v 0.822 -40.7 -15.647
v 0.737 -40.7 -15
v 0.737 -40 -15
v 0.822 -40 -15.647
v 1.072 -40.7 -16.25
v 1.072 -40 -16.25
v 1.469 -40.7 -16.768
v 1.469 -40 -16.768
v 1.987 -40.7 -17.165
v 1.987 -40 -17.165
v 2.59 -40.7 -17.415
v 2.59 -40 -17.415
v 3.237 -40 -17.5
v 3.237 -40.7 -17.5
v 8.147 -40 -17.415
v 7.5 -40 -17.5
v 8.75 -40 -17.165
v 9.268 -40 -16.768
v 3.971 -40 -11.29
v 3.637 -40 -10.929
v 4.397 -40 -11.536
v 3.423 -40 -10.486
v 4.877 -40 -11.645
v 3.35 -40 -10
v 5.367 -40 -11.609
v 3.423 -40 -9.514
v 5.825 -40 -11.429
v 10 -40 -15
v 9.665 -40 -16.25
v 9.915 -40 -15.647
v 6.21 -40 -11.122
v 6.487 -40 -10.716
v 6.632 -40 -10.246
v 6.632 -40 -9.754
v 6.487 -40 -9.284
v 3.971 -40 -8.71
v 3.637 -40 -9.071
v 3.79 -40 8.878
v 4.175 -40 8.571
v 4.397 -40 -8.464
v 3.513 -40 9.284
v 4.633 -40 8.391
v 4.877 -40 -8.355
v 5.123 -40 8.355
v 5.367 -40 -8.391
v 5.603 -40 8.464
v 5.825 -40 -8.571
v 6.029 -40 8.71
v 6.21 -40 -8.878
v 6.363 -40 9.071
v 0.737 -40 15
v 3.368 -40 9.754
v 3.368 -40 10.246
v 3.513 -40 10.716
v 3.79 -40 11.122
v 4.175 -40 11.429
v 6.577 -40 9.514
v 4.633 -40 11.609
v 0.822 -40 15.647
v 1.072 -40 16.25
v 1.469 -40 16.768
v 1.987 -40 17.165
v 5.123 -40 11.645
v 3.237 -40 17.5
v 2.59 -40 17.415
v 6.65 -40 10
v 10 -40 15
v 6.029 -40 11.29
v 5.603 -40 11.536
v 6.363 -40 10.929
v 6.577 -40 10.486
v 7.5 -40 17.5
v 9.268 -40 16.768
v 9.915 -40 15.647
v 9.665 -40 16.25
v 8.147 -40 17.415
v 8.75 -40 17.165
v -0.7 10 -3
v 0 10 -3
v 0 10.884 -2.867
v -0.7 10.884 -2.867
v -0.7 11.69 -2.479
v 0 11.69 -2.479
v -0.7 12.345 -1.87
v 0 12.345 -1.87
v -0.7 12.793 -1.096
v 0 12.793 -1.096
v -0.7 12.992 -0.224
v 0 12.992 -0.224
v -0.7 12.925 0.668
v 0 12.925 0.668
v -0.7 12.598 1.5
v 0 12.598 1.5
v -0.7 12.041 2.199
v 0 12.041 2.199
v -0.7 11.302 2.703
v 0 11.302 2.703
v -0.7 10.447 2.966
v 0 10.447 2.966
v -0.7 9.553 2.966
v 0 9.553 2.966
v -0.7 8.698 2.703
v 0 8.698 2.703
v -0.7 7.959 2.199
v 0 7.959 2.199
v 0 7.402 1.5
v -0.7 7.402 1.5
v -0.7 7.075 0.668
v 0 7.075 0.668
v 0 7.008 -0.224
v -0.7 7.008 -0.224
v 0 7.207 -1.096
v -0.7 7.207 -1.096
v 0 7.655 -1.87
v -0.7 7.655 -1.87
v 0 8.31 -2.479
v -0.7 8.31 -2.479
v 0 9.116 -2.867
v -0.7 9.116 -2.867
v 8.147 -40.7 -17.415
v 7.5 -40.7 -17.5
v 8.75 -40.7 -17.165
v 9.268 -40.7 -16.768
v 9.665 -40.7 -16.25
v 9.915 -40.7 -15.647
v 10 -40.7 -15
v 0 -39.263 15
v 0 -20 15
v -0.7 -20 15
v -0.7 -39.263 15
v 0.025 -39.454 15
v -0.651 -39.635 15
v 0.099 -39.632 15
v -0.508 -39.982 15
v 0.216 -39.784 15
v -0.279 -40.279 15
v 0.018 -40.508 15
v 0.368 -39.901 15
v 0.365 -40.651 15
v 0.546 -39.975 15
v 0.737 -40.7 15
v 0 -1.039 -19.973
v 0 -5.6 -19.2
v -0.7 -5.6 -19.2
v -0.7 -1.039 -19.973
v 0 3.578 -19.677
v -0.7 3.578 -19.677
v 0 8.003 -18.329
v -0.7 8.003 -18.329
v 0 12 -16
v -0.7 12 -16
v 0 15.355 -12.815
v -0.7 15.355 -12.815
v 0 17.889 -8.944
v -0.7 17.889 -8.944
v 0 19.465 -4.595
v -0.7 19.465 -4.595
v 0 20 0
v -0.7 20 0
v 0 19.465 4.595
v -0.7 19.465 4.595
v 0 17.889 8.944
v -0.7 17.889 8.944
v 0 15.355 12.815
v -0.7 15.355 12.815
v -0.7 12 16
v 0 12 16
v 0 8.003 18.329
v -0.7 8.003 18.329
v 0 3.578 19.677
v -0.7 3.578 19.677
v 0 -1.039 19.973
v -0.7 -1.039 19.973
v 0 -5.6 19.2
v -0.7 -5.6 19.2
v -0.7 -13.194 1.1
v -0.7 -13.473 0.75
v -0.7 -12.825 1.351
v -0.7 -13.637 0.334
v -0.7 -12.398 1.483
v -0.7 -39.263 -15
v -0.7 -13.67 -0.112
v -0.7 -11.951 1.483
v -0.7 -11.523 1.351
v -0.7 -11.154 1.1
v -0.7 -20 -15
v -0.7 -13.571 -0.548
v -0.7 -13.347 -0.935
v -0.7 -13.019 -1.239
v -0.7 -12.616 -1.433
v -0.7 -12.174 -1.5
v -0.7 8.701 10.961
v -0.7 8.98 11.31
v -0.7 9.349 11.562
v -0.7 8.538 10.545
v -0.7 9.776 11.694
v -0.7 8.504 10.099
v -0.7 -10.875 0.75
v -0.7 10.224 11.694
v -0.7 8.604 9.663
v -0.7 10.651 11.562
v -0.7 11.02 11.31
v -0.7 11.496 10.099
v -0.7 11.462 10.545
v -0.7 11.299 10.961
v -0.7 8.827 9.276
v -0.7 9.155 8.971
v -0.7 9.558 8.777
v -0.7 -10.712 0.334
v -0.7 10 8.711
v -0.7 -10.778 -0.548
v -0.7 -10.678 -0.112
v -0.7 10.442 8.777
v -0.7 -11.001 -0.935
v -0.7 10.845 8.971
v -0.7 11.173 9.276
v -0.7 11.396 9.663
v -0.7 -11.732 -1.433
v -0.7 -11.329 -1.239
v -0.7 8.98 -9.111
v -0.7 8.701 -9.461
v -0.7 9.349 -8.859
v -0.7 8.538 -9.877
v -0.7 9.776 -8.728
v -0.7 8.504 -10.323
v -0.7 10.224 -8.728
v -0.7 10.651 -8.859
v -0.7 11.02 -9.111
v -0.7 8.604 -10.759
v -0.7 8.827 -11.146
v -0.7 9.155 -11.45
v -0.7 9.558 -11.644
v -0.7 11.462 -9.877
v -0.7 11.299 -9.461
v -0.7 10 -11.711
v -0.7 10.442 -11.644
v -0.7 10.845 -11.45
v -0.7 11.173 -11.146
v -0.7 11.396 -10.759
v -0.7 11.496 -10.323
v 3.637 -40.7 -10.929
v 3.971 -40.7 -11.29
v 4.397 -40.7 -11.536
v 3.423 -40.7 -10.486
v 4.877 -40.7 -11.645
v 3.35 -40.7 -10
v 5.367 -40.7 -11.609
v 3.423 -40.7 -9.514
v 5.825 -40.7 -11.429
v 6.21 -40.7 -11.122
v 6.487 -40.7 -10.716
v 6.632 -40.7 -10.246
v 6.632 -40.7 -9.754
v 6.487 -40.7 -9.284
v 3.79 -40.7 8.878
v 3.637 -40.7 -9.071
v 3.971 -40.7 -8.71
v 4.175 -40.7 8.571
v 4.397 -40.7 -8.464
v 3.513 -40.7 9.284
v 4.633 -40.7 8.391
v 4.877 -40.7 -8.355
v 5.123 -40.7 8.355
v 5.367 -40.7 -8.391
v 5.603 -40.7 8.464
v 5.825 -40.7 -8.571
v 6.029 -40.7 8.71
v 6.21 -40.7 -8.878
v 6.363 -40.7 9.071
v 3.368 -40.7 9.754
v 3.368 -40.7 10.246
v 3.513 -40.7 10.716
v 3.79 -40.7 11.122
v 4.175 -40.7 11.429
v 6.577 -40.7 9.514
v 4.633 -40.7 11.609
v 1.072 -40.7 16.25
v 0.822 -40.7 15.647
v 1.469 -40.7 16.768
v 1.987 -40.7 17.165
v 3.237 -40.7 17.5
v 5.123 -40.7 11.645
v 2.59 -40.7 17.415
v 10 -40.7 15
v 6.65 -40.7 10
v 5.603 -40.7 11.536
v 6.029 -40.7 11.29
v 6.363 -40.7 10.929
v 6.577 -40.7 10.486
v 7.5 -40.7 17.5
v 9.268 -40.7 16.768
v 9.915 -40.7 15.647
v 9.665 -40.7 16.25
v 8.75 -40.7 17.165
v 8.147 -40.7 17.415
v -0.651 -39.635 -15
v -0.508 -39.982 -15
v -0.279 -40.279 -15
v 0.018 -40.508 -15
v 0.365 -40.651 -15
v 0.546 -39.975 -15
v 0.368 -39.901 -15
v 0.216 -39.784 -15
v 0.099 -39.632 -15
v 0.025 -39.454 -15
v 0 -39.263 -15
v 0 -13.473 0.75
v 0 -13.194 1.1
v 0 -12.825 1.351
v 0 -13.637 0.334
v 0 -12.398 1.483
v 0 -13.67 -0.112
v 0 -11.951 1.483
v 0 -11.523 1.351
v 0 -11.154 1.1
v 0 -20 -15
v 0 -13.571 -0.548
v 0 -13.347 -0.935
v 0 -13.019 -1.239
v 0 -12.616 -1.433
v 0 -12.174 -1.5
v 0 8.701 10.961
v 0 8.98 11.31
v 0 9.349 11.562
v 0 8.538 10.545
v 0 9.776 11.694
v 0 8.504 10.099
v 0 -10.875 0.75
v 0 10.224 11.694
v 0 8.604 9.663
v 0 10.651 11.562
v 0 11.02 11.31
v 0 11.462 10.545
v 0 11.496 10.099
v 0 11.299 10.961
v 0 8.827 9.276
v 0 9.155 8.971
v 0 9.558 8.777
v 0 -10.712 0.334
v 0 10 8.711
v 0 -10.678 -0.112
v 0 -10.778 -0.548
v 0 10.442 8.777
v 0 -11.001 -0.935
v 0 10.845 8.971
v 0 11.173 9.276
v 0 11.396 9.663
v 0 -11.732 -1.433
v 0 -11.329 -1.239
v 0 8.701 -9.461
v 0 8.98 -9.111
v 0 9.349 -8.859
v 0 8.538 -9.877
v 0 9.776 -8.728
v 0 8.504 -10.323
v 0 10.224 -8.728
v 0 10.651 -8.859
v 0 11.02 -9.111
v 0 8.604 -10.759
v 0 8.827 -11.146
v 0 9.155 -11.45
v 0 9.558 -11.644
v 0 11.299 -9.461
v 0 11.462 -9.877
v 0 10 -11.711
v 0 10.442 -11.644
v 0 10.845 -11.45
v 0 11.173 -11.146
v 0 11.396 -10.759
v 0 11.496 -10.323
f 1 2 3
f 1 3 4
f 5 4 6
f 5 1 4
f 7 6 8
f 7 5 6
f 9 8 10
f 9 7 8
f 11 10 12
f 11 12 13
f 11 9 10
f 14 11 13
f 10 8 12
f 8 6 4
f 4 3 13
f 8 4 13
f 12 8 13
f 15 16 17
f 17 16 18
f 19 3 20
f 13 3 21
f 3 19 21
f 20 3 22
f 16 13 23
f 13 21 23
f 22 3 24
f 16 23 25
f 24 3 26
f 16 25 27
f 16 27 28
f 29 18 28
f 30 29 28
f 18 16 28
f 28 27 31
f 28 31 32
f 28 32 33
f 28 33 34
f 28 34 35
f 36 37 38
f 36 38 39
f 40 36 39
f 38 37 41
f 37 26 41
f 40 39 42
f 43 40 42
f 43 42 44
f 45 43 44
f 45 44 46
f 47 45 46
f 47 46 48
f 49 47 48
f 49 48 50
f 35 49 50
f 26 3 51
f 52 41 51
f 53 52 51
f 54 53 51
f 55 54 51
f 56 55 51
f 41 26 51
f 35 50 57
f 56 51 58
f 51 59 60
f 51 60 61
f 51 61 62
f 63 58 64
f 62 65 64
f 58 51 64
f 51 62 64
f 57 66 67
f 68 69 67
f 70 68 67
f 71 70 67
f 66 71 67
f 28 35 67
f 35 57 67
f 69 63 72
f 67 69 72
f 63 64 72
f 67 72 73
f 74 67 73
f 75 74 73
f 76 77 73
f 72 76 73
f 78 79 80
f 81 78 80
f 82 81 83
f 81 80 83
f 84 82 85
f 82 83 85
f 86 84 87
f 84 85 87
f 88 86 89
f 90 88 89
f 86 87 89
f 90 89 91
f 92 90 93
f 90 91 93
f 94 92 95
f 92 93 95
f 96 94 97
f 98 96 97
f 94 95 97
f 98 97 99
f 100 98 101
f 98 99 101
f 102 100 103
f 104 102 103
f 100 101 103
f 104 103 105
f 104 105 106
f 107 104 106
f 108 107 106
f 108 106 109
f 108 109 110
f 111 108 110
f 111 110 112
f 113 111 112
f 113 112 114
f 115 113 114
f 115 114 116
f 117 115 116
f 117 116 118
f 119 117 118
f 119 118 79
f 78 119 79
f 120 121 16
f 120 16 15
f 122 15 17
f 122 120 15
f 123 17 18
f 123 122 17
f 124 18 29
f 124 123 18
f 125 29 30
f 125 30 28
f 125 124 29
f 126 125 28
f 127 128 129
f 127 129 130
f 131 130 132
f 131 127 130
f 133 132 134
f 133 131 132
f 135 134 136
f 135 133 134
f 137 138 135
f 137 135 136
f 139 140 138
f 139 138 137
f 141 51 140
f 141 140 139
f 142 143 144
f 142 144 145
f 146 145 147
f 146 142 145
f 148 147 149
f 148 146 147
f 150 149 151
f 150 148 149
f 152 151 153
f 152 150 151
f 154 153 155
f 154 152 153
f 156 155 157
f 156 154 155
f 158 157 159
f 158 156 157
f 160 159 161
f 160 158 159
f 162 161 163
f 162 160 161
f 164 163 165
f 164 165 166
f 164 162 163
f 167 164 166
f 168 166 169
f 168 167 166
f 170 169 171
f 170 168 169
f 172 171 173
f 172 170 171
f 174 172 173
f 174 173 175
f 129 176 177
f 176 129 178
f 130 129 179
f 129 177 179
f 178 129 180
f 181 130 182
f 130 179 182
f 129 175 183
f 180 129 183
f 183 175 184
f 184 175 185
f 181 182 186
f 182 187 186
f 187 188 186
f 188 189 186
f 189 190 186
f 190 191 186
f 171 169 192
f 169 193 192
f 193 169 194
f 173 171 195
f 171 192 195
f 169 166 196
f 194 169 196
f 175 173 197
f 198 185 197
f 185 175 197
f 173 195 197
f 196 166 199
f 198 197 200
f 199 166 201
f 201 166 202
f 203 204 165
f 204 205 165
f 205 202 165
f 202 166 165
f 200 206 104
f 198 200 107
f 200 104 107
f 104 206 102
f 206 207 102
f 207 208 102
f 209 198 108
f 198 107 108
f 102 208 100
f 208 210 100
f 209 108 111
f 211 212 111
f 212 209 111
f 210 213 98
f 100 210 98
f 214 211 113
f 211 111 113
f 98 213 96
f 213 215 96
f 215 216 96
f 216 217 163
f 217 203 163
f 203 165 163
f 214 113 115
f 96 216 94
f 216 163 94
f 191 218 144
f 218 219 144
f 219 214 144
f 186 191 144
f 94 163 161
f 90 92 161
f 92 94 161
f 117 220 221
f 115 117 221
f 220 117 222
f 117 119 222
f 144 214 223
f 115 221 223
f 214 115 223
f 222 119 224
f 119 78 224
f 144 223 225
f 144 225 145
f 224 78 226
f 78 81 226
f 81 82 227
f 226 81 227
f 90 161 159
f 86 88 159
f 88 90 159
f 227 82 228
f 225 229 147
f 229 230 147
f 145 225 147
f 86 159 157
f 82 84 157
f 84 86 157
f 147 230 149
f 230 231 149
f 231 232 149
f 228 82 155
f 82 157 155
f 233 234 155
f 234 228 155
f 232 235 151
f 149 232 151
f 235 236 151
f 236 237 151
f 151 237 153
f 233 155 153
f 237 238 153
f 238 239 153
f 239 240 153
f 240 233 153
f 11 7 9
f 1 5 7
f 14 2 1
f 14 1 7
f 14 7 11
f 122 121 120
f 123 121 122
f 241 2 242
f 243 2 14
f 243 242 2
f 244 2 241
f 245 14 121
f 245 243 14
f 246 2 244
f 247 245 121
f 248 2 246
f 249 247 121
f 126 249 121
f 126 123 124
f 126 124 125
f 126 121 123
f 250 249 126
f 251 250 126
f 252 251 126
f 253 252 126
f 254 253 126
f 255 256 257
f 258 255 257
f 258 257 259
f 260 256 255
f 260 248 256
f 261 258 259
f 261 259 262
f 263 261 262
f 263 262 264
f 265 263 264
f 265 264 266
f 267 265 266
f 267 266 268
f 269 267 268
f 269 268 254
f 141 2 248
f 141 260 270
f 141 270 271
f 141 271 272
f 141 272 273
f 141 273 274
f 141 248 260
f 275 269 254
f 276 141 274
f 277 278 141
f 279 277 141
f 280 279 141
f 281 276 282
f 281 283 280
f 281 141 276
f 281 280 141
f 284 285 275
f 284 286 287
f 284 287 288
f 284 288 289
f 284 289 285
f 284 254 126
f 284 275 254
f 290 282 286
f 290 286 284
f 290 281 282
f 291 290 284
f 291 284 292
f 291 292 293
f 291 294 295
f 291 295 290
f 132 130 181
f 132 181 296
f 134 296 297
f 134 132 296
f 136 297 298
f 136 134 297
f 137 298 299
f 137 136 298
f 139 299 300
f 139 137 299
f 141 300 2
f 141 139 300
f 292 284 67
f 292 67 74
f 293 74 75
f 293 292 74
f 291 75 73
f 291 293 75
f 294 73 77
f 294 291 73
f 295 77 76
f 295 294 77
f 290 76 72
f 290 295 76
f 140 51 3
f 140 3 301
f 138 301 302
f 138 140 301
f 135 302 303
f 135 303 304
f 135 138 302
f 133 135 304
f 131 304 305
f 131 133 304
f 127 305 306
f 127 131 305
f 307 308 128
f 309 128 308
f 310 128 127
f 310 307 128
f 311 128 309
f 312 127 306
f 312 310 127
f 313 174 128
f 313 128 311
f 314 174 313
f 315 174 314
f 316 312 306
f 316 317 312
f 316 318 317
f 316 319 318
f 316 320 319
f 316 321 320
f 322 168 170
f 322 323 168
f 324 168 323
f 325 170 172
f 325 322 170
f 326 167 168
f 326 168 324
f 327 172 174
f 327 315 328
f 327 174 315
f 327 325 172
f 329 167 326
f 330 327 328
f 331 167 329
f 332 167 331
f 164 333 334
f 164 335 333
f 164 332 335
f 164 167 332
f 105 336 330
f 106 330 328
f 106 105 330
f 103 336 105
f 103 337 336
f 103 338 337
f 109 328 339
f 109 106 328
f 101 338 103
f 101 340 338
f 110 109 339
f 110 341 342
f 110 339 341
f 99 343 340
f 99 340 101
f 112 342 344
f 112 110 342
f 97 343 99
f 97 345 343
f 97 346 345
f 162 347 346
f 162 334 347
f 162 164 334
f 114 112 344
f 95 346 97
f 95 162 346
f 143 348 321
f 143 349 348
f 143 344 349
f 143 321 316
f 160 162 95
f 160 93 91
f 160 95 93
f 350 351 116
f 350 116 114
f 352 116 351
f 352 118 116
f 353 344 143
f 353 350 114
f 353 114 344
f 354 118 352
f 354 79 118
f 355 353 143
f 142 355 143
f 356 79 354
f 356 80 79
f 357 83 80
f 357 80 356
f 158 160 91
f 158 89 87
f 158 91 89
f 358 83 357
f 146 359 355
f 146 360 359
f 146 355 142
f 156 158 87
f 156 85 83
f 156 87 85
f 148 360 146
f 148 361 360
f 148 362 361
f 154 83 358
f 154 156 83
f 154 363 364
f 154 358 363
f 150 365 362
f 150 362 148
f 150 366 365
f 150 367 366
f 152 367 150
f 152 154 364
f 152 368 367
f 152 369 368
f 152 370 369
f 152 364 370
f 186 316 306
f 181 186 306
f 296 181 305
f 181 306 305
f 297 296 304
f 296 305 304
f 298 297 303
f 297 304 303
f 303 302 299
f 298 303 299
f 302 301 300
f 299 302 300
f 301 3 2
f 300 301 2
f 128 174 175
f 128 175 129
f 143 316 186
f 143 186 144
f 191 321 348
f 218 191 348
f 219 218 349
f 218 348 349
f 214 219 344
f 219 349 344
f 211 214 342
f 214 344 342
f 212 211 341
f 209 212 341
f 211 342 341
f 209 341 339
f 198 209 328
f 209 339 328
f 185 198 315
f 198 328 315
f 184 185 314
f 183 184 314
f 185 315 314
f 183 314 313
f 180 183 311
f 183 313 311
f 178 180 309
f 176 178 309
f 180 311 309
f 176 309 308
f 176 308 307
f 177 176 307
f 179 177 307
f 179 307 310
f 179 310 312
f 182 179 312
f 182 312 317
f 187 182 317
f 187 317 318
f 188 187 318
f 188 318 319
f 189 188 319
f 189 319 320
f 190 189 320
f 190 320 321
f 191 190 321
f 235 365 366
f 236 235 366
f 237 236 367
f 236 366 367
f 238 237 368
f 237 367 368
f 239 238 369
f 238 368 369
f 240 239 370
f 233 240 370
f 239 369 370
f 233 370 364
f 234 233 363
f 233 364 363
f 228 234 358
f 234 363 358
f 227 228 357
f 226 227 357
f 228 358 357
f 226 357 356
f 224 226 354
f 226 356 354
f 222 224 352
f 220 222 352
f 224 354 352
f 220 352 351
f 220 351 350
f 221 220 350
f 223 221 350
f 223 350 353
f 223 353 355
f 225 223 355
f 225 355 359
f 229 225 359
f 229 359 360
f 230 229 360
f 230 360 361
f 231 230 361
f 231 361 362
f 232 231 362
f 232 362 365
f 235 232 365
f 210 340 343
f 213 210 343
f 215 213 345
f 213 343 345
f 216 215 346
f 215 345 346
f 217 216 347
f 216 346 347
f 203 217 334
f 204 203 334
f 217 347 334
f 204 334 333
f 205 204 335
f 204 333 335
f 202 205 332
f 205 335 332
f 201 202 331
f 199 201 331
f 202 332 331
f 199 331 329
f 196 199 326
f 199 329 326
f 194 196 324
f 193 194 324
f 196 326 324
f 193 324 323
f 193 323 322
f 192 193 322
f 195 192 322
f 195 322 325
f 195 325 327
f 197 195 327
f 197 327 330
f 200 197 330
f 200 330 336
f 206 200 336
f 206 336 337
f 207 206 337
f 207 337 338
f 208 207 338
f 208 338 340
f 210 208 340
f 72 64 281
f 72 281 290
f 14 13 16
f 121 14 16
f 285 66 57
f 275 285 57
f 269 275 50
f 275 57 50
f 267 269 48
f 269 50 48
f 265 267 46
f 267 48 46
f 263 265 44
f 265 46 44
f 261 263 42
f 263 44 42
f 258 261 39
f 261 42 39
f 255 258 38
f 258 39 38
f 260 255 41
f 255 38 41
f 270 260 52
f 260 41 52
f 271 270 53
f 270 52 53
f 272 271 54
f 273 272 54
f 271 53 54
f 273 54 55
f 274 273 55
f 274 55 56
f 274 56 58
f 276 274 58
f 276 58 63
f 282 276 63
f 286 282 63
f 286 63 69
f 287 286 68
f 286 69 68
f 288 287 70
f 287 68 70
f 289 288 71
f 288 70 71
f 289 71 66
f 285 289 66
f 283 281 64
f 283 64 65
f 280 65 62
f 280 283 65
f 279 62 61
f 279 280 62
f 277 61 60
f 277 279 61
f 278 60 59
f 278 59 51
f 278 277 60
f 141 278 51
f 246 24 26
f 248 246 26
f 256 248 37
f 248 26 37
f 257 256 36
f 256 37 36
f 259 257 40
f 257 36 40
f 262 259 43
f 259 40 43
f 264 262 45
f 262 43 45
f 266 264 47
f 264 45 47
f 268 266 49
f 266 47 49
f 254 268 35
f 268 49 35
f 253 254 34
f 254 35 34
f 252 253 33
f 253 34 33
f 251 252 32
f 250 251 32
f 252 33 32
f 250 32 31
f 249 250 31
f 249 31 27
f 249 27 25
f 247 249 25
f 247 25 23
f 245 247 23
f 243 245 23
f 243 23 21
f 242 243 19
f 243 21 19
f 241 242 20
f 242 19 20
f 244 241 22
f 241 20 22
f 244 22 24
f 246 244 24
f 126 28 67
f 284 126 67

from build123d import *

# Parameters (mm, degrees)
BASE_FLANGE1_DEPTH           = 0.7
SKETCH4_R                    = 1.5
SKETCH4_R_2                  = 3
CUT_EXTRUDE1_DEPTH           = 45.726837581
EDGE_FLANGE1_STRIP_W         = 4.2732
EDGE_FLANGE1_STRIP_H         = 0.7
EDGE_FLANGE1_STRIP_CUT_DEPTH = 30
EDGE_FLANGE1_DEPTH           = 30
SKETCH11_W                   = 9.2634
SKETCH11_H                   = 2.5
TAB1_DEPTH                   = 0.7
SKETCH10_R                   = 1.65
CUT_EXTRUDE2_DEPTH           = 0.7
BREAK_CORNER1_START          = -40.7
BREAK_CORNER1_DEPTH          = 0.7


# Read off the part's stored shape, not the designer's step: Break-Corner1
# Sheet-metal steps are written as plain solids
with BuildPart() as part:
    # Sketch1 → Base-Flange1 (new body)
    with BuildSketch(Plane(origin=(0, 0, 0), x_dir=(0, 0, -1), z_dir=(1, 0, 0))):
        with BuildLine():
            Line((-19.2, -5.6), (-15, -20))
            Line((-15, -20), (-15, -40))
            Line((-15, -40), (15, -40))
            Line((15, -40), (15, -20))
            Line((15, -20), (19.2, -5.6))
            ThreePointArc((19.2, -5.6), (0, 20), (-19.2, -5.6))
        make_face()
    extrude(amount=-BASE_FLANGE1_DEPTH)

    # Sketch4 → Cut-Extrude1 (cut, through all)
    with BuildSketch(Plane(origin=(0, 0, 0), x_dir=(0, 0, -1), z_dir=(1, 0, 0))):
        with Locations((-10.2108, 10)):
            Circle(SKETCH4_R)
        with Locations((10.2108, 10)):
            Circle(SKETCH4_R)
        with Locations((0, 10)):
            Circle(SKETCH4_R_2)
        with Locations((0, -12.1742)):
            Circle(SKETCH4_R)
    extrude(amount=-CUT_EXTRUDE1_DEPTH, mode=Mode.SUBTRACT)

    # Edge-Flange1 strip (across the edge) → Edge-Flange1 strip cut (cut)
    with BuildSketch(Plane(origin=(0, -40, 15), x_dir=(0, 1, 0), z_dir=(0, 0, -1))):
        with Locations((-1.4, -0.35)):
            Rectangle(EDGE_FLANGE1_STRIP_W, EDGE_FLANGE1_STRIP_H)
    extrude(amount=EDGE_FLANGE1_STRIP_CUT_DEPTH, mode=Mode.SUBTRACT)

    # Edge-Flange1 section (across the edge) → Edge-Flange1 (add)
    with BuildSketch(Plane(origin=(0, -40, 15), x_dir=(0, 1, 0), z_dir=(0, 0, -1))):
        with BuildLine():
            Line((-0.7, 0.7366), (-0.7, 10))
            Line((-0.7, 10), (0, 10))
            Line((0, 10), (0, 0.7366))
            ThreePointArc((0, 0.7366), (0.215745145, 0.215745145), (0.7366, 0))
            Line((0.7366, 0), (0.7366, -0.7))
            ThreePointArc((0.7366, -0.7), (-0.279229602, -0.279229602), (-0.7, 0.7366))
        make_face()
    extrude(amount=EDGE_FLANGE1_DEPTH)

    # Sketch11 → Tab1 (add)
    with BuildSketch(Plane(origin=(0, -40, 0), x_dir=(1, 0, 0), z_dir=(0, 1, 0))):
        with Locations((5.3683, -16.25)):
            Rectangle(SKETCH11_W, SKETCH11_H)
    tab1 = extrude(amount=-TAB1_DEPTH)

    # Mirror1: Tab1 across plane
    add(tab1.mirror(Plane.XY))

    # Sketch10 → Cut-Extrude2 (cut)
    with BuildSketch(Plane(origin=(0, -40, 0), x_dir=(1, 0, 0), z_dir=(0, 1, 0))):
        with Locations(Location((5, 10, 0), (0, 0, 180))):
            Circle(SKETCH10_R)
        with Locations((5, -10)):
            Circle(SKETCH10_R)
    extrude(amount=-CUT_EXTRUDE2_DEPTH, mode=Mode.SUBTRACT)

    # Break-Corner1 outline → Break-Corner1 (cut)
    with BuildSketch(Plane(origin=(0, 0, 0), x_dir=(1, 0, 0), z_dir=(0, 1, 0)).offset(BREAK_CORNER1_START)):
        with BuildLine():
            Line((10, -17.5), (10, -15))
            ThreePointArc((10, -15), (9.267766953, -16.767766953), (7.5, -17.5))
            Line((7.5, -17.5), (10, -17.5))
        make_face()
        with BuildLine():
            ThreePointArc((0.7366, 15), (1.468833047, 16.767766953), (3.2366, 17.5))
            Line((3.2366, 17.5), (0.7366, 17.5))
            Line((0.7366, 17.5), (0.7366, 15))
        make_face()
        with BuildLine():
            ThreePointArc((7.5, 17.5), (9.267766953, 16.767766953), (10, 15))
            Line((10, 15), (10, 17.5))
            Line((10, 17.5), (7.5, 17.5))
        make_face()
        with BuildLine():
            Line((0.7366, -17.5), (3.2366, -17.5))
            ThreePointArc((3.2366, -17.5), (1.468833047, -16.767766953), (0.7366, -15))
            Line((0.7366, -15), (0.7366, -17.5))
        make_face()
    extrude(amount=BREAK_CORNER1_DEPTH, mode=Mode.SUBTRACT)


solid = part.part
